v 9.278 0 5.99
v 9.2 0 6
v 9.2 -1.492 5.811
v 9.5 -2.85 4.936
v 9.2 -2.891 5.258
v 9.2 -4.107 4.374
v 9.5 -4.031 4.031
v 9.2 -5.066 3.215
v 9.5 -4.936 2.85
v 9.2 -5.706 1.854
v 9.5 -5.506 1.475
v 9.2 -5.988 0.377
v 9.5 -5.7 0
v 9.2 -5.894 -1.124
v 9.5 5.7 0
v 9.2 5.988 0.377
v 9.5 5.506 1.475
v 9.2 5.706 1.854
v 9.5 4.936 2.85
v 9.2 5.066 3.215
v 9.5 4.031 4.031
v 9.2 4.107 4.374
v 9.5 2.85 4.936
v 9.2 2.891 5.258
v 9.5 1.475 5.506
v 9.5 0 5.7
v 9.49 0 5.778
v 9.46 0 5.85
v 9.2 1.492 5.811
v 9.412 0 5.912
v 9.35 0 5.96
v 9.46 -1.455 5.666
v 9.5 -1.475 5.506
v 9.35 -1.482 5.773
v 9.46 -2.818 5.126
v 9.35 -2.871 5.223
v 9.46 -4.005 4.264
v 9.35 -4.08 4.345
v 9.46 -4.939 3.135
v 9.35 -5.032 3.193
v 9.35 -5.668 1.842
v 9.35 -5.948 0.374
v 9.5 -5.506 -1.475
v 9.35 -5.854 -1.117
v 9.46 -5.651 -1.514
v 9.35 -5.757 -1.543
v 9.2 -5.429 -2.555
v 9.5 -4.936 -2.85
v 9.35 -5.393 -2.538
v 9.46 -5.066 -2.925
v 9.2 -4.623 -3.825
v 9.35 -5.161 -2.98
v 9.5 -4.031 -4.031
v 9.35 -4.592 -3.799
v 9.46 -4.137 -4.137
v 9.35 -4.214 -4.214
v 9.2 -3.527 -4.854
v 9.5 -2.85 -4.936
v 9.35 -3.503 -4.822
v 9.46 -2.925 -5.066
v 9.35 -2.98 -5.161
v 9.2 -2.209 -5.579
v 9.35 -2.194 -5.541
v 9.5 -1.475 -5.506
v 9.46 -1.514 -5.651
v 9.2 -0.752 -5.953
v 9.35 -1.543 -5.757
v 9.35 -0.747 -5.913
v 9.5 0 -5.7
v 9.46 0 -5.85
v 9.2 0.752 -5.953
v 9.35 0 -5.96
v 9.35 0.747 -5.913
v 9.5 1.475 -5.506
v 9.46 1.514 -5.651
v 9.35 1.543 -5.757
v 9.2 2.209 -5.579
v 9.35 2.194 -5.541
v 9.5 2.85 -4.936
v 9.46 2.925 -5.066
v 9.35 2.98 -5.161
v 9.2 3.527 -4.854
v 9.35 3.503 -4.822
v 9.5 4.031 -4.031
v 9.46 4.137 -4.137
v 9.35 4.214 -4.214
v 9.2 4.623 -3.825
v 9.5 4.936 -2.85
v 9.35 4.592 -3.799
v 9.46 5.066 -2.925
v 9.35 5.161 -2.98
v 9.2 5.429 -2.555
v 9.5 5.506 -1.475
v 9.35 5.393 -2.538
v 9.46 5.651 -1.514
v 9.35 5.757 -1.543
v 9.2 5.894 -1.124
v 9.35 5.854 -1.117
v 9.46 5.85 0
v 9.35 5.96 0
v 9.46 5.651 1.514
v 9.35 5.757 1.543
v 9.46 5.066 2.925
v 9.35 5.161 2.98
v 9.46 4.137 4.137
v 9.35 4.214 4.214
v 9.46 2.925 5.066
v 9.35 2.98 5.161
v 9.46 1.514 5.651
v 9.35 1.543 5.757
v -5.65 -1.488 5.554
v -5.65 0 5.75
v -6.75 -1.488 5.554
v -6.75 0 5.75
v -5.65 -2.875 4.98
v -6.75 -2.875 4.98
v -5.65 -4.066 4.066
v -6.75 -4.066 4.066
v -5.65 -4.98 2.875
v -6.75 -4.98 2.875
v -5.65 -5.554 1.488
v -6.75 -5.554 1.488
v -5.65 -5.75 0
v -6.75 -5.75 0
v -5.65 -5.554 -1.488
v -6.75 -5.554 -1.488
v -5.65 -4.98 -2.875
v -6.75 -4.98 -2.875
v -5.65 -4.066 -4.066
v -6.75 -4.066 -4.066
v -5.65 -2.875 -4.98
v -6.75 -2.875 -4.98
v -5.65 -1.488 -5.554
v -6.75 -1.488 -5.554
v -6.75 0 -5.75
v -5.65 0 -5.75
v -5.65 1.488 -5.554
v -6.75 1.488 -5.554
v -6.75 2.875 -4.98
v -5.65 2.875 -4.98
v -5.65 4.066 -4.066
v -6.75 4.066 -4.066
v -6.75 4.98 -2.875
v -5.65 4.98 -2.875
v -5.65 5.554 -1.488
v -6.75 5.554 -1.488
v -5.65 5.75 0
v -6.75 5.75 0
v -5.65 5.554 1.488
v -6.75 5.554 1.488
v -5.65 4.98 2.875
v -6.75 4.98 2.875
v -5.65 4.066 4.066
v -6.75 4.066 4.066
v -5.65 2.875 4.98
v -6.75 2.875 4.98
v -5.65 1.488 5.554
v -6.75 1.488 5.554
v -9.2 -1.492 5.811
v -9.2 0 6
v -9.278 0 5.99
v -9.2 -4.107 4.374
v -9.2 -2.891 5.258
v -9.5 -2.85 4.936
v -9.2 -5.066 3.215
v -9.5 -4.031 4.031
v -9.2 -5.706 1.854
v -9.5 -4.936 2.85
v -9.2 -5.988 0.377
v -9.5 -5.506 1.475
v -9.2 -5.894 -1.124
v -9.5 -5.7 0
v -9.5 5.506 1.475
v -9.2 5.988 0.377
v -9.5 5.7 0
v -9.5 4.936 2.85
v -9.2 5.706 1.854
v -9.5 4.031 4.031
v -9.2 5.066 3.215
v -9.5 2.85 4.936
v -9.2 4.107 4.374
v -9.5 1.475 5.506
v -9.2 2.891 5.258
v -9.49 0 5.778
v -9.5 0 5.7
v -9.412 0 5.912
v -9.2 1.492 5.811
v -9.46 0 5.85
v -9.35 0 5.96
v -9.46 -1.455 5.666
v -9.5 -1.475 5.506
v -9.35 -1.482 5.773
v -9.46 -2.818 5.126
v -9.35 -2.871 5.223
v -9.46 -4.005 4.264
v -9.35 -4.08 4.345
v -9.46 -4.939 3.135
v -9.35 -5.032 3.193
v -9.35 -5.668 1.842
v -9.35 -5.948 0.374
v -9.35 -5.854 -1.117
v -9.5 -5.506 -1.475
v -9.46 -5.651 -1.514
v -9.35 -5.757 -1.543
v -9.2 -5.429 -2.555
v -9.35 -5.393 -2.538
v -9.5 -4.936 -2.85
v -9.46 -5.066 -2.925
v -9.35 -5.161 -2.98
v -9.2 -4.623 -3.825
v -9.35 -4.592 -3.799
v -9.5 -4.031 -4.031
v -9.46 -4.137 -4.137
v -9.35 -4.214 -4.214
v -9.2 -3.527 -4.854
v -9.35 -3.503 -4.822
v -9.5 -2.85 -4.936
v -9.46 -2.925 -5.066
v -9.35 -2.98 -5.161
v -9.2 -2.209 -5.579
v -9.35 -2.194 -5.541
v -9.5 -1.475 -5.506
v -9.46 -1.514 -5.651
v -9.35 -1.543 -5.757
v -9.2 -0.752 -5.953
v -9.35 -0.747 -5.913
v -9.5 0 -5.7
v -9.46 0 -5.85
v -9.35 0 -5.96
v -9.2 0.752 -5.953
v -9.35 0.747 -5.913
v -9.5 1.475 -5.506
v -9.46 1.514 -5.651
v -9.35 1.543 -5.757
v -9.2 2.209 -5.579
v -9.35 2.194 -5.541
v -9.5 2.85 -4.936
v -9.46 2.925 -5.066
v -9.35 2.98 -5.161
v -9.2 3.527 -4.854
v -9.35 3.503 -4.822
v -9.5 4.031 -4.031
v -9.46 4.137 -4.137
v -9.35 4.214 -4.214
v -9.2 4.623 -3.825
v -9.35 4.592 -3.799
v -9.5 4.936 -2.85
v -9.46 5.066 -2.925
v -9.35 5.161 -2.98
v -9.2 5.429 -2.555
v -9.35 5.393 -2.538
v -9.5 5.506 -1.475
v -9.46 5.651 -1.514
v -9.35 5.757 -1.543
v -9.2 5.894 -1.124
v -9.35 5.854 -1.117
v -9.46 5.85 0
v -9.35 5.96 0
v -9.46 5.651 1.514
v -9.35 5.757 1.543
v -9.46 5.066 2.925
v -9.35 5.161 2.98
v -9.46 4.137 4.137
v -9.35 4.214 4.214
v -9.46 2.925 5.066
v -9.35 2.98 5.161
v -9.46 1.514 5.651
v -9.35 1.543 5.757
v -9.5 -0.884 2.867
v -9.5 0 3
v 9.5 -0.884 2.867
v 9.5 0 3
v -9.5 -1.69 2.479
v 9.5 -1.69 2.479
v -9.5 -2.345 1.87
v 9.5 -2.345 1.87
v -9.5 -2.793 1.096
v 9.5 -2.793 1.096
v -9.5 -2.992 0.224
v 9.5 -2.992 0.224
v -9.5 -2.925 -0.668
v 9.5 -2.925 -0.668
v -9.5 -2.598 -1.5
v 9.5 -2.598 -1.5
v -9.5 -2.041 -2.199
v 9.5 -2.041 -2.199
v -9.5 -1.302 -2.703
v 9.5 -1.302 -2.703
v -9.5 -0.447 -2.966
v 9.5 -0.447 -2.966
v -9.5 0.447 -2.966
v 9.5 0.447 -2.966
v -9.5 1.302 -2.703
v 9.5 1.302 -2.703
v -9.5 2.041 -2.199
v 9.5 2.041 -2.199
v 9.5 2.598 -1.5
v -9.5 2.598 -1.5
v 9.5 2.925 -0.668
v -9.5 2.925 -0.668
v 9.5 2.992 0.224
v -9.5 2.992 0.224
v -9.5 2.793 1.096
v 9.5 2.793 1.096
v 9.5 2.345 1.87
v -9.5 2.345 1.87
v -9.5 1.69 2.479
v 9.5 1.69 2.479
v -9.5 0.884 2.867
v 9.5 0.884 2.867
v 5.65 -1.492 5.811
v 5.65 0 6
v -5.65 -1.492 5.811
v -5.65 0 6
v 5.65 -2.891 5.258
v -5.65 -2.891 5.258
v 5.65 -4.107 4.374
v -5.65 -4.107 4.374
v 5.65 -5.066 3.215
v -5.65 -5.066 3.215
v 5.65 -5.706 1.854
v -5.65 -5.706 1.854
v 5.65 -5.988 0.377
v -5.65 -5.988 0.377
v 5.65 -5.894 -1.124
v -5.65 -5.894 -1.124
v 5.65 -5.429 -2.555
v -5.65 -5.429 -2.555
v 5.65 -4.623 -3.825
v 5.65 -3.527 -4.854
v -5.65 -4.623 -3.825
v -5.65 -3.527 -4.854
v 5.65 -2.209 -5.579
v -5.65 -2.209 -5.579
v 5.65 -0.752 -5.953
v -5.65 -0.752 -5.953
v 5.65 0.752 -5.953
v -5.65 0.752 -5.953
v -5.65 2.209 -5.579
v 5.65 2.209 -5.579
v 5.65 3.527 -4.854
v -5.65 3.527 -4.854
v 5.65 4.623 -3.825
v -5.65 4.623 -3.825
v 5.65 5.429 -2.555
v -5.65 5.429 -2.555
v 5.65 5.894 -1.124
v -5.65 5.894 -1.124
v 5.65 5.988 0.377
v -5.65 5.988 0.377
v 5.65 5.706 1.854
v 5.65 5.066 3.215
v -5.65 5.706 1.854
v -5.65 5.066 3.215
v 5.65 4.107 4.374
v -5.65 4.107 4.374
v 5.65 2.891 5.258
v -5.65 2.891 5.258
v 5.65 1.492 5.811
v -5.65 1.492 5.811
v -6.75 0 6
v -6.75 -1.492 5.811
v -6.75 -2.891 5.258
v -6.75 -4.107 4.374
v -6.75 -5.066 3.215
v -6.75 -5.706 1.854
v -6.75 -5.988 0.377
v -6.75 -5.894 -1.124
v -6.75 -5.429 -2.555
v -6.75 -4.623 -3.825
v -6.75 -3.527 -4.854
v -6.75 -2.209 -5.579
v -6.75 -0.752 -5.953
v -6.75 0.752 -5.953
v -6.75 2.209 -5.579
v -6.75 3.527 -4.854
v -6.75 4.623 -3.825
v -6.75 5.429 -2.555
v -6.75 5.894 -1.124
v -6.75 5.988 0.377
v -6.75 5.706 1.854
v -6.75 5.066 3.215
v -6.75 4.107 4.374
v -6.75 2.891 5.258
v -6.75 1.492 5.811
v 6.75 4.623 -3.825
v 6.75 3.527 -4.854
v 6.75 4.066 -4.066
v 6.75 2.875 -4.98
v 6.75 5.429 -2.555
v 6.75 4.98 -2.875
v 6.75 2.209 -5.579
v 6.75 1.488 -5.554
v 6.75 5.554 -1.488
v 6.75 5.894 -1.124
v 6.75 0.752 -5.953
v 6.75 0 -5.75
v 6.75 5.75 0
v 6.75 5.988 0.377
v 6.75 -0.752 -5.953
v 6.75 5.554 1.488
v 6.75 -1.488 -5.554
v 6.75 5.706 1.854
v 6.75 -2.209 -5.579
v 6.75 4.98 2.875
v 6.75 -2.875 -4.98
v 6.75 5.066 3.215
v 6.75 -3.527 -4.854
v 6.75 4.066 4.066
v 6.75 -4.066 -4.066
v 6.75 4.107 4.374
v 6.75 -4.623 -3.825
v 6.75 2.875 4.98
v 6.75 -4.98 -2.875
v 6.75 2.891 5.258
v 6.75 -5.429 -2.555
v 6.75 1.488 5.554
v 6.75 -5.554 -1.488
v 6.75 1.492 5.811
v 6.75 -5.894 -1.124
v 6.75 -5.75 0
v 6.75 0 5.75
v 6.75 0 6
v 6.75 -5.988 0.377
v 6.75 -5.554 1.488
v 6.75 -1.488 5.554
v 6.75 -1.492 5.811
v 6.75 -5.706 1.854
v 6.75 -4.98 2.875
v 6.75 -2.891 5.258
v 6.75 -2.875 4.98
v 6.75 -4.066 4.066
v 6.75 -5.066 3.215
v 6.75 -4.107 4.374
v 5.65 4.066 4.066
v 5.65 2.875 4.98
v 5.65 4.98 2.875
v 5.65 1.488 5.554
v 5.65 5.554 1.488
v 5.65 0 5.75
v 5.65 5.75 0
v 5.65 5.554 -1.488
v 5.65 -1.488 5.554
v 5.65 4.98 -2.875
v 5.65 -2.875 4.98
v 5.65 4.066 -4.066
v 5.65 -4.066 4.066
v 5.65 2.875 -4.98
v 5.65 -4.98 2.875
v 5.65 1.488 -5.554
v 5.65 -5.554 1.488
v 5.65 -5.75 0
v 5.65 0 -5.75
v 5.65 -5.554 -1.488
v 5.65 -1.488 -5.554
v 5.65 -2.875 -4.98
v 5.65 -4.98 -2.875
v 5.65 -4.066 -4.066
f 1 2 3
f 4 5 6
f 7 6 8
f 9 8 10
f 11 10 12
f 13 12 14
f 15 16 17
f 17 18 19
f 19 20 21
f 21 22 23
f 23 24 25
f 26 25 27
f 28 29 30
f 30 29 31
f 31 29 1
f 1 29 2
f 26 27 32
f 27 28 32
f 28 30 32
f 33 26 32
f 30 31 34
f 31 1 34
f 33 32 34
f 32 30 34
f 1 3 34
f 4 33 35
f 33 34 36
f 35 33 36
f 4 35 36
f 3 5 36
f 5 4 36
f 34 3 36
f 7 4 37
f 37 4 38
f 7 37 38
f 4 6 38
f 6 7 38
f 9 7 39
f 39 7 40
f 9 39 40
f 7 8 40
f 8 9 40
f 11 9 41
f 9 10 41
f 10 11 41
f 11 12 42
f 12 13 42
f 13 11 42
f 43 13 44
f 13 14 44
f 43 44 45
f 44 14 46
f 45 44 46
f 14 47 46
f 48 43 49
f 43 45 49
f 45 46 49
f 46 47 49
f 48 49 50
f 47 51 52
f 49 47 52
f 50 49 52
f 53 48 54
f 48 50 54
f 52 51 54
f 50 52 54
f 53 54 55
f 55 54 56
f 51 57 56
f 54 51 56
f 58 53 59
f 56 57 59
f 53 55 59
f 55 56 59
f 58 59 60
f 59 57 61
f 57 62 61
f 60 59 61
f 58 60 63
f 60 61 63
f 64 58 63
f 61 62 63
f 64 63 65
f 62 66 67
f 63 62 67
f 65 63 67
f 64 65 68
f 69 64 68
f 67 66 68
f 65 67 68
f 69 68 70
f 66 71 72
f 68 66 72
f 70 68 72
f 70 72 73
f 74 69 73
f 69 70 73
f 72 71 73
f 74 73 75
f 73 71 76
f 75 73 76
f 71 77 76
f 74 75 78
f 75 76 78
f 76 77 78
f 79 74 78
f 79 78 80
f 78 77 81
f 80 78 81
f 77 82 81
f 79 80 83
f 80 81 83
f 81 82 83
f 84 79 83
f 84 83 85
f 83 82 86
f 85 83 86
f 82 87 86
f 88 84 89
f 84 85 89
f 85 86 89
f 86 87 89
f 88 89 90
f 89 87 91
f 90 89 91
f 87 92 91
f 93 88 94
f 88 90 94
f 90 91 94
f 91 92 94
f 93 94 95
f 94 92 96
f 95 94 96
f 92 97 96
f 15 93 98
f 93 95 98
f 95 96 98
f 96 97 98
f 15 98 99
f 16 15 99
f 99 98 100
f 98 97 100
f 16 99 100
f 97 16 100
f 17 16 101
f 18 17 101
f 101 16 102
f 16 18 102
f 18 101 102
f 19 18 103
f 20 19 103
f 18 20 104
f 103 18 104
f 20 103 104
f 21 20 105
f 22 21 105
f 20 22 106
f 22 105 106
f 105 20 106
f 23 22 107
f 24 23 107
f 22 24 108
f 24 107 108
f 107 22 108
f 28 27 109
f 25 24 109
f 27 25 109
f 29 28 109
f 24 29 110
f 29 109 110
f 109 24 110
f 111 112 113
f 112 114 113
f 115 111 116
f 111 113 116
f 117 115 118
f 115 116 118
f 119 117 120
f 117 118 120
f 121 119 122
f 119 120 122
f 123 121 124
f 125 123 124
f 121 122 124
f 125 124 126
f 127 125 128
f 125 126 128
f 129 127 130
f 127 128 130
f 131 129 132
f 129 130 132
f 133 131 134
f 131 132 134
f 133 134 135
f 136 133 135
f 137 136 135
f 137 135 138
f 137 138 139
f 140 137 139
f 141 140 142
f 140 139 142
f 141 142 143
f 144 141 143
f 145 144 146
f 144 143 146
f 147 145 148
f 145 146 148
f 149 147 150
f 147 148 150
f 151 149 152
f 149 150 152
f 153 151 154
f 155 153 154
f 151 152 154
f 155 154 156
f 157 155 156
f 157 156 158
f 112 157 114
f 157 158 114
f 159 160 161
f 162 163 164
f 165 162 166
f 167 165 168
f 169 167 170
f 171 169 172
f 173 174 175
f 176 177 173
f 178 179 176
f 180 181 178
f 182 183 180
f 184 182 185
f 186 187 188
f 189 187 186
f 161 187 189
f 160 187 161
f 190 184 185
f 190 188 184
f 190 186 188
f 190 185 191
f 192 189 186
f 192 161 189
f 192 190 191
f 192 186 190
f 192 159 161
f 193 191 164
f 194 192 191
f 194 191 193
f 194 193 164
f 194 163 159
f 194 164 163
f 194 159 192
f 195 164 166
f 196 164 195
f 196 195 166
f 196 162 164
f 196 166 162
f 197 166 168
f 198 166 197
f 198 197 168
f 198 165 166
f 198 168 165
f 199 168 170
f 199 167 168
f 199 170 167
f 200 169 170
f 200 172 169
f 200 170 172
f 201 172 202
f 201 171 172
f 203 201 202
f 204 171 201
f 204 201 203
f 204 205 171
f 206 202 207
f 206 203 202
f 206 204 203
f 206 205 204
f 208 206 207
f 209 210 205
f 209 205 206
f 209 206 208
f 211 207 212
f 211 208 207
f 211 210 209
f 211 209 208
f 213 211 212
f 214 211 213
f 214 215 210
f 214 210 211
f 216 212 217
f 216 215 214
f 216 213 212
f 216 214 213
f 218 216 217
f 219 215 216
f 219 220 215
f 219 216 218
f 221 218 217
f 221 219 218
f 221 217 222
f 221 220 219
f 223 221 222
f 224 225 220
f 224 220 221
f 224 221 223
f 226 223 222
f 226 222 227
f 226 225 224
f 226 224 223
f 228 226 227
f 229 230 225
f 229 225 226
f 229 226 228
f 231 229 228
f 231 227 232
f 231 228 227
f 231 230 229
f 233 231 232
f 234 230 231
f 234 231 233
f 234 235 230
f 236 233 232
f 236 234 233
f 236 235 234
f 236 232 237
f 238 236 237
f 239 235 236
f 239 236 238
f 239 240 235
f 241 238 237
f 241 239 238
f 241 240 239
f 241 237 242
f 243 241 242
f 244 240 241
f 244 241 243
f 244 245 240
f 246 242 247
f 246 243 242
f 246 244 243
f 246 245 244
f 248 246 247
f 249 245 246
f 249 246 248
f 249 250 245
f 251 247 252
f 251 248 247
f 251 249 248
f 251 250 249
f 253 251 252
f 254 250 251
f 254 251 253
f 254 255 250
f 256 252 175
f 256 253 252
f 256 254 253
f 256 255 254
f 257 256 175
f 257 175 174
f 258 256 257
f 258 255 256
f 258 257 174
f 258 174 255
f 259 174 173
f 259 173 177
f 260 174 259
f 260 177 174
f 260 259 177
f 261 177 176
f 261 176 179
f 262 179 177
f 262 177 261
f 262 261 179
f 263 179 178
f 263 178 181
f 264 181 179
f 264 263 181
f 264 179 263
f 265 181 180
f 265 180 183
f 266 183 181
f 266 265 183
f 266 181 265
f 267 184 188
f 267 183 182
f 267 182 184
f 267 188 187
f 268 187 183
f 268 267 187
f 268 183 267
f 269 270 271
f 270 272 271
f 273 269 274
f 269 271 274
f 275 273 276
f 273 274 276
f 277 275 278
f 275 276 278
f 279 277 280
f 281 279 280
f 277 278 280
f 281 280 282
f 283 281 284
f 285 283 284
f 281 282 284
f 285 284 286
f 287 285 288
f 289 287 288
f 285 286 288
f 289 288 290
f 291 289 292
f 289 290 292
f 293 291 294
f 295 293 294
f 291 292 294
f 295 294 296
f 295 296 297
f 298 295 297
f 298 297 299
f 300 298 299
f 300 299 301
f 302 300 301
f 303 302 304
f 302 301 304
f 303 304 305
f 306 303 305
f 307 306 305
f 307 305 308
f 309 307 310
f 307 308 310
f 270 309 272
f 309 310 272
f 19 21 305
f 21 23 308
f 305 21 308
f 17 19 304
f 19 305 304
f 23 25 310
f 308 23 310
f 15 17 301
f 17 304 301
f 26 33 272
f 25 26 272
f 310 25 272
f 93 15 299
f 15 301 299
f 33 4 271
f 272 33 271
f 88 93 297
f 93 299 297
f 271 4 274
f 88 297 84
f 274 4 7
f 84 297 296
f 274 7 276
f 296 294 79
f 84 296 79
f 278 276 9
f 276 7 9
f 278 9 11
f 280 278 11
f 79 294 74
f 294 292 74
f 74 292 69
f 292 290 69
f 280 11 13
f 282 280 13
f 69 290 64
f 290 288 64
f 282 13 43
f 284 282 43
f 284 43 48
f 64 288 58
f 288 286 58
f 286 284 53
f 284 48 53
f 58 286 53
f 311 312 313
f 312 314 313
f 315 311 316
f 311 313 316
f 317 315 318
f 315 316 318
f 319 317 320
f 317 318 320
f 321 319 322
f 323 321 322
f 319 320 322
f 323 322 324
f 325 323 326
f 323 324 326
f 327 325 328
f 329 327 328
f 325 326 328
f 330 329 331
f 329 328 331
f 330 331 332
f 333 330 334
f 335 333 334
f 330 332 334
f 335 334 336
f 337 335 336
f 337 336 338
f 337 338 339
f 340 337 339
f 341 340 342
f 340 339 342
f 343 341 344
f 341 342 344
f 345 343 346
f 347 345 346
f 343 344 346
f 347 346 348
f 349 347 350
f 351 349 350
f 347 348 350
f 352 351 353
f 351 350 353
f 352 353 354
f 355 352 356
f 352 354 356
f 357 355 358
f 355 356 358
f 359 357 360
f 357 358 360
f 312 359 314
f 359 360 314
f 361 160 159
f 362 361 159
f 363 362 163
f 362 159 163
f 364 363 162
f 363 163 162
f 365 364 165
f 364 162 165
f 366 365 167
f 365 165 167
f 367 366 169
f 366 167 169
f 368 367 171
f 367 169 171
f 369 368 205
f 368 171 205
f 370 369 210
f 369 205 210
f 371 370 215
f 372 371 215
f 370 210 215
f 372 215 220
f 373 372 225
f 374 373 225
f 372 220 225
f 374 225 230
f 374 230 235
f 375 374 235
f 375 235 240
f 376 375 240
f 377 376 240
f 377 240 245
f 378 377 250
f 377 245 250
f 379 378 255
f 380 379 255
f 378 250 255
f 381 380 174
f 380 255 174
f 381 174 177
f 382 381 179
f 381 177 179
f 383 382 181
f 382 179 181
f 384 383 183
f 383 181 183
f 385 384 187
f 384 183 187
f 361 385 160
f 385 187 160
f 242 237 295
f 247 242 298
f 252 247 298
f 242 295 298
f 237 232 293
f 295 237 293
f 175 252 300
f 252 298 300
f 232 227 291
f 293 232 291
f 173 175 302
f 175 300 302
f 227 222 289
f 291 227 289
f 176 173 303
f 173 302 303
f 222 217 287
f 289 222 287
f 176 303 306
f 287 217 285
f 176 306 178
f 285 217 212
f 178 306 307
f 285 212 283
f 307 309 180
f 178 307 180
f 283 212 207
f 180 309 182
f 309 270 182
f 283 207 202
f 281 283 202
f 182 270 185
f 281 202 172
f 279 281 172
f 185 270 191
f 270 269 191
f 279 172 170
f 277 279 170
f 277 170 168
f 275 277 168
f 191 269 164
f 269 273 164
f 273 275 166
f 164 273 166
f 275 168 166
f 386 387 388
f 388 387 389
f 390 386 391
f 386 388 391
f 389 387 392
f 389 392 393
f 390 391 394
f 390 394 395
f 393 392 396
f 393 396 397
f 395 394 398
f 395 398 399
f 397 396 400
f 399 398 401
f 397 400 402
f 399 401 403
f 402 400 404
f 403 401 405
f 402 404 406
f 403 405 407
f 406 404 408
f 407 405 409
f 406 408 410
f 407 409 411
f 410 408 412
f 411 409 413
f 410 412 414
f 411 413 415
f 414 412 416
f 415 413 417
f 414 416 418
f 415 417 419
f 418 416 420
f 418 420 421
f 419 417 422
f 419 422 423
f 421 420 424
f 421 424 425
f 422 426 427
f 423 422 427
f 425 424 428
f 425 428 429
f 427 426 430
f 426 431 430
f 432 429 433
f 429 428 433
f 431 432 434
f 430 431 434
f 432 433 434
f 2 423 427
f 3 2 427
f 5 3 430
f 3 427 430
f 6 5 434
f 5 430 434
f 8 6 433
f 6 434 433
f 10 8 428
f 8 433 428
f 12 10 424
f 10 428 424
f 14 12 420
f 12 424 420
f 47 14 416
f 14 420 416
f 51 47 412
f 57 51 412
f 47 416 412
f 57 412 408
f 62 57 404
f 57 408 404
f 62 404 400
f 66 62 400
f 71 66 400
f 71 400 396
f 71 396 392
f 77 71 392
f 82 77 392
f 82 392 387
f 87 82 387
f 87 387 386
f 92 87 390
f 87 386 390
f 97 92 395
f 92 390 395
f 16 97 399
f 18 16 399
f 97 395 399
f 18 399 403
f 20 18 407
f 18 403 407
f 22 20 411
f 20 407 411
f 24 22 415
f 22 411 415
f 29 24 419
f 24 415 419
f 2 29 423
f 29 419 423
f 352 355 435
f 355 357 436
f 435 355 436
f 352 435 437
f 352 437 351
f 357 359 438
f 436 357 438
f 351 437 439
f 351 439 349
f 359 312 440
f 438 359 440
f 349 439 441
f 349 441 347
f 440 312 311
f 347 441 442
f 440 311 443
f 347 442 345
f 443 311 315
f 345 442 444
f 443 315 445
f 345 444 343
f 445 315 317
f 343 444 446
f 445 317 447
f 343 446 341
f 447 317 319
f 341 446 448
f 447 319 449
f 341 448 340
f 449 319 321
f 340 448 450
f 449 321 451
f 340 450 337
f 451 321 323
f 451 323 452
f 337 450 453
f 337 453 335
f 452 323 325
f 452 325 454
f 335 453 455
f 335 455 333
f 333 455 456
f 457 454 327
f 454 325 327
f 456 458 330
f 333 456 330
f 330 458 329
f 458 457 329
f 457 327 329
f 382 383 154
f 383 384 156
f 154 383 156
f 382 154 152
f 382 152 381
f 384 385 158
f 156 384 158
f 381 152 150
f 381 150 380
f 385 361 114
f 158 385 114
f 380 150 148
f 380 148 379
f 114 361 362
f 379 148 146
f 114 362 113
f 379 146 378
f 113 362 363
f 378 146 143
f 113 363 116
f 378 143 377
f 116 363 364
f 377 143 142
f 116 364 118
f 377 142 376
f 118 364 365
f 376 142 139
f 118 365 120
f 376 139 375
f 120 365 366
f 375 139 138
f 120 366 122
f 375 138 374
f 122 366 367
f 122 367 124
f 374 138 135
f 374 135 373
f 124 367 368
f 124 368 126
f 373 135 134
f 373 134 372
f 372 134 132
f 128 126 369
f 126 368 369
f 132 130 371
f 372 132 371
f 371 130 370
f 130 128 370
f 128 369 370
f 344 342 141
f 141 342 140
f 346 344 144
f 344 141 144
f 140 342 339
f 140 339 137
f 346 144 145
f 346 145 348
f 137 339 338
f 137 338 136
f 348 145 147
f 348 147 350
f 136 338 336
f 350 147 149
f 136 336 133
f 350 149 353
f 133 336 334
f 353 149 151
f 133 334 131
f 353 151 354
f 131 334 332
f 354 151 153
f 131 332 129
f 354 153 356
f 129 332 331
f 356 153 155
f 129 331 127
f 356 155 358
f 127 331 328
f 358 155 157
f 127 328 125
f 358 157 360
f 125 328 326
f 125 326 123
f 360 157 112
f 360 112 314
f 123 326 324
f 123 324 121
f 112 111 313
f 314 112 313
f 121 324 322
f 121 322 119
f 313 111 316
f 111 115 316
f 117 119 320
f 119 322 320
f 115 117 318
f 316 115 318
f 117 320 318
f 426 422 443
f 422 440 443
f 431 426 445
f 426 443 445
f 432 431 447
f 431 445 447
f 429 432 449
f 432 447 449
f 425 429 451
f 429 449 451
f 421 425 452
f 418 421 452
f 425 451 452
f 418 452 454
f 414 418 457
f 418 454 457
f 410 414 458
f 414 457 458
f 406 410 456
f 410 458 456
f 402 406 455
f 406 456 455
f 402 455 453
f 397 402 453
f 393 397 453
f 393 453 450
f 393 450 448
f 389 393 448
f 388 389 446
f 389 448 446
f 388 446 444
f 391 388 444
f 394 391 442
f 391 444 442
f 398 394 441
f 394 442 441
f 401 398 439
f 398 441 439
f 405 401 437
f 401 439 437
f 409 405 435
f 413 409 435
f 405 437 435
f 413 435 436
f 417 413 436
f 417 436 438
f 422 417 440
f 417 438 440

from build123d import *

# Parameters (mm, degrees)
F3_R = 0.3


with BuildPart() as f2:
    # F1 (on Front) → F2 (revolve)
    with BuildSketch(Plane.XZ):
        Polygon((-9.5, 6), (-9.5, 3), (9.5, 3), (9.5, 6), (6.75, 6), (6.75, 5.75), (5.65, 5.75), (5.65, 6), (-5.65, 6), (-5.65, 5.75), (-6.75, 5.75), (-6.75, 6), align=None)
    revolve(axis=Axis((0, 0, 0), (1, 0, 0)))

    # F3
    f3_edges = [f2.edges().sort_by_distance(p)[0] for p in [
        (-9.5, 0, -6),
        (9.5, 0, -6),
    ]]
    fillet(f3_edges, radius=F3_R)


solid = f2.part
